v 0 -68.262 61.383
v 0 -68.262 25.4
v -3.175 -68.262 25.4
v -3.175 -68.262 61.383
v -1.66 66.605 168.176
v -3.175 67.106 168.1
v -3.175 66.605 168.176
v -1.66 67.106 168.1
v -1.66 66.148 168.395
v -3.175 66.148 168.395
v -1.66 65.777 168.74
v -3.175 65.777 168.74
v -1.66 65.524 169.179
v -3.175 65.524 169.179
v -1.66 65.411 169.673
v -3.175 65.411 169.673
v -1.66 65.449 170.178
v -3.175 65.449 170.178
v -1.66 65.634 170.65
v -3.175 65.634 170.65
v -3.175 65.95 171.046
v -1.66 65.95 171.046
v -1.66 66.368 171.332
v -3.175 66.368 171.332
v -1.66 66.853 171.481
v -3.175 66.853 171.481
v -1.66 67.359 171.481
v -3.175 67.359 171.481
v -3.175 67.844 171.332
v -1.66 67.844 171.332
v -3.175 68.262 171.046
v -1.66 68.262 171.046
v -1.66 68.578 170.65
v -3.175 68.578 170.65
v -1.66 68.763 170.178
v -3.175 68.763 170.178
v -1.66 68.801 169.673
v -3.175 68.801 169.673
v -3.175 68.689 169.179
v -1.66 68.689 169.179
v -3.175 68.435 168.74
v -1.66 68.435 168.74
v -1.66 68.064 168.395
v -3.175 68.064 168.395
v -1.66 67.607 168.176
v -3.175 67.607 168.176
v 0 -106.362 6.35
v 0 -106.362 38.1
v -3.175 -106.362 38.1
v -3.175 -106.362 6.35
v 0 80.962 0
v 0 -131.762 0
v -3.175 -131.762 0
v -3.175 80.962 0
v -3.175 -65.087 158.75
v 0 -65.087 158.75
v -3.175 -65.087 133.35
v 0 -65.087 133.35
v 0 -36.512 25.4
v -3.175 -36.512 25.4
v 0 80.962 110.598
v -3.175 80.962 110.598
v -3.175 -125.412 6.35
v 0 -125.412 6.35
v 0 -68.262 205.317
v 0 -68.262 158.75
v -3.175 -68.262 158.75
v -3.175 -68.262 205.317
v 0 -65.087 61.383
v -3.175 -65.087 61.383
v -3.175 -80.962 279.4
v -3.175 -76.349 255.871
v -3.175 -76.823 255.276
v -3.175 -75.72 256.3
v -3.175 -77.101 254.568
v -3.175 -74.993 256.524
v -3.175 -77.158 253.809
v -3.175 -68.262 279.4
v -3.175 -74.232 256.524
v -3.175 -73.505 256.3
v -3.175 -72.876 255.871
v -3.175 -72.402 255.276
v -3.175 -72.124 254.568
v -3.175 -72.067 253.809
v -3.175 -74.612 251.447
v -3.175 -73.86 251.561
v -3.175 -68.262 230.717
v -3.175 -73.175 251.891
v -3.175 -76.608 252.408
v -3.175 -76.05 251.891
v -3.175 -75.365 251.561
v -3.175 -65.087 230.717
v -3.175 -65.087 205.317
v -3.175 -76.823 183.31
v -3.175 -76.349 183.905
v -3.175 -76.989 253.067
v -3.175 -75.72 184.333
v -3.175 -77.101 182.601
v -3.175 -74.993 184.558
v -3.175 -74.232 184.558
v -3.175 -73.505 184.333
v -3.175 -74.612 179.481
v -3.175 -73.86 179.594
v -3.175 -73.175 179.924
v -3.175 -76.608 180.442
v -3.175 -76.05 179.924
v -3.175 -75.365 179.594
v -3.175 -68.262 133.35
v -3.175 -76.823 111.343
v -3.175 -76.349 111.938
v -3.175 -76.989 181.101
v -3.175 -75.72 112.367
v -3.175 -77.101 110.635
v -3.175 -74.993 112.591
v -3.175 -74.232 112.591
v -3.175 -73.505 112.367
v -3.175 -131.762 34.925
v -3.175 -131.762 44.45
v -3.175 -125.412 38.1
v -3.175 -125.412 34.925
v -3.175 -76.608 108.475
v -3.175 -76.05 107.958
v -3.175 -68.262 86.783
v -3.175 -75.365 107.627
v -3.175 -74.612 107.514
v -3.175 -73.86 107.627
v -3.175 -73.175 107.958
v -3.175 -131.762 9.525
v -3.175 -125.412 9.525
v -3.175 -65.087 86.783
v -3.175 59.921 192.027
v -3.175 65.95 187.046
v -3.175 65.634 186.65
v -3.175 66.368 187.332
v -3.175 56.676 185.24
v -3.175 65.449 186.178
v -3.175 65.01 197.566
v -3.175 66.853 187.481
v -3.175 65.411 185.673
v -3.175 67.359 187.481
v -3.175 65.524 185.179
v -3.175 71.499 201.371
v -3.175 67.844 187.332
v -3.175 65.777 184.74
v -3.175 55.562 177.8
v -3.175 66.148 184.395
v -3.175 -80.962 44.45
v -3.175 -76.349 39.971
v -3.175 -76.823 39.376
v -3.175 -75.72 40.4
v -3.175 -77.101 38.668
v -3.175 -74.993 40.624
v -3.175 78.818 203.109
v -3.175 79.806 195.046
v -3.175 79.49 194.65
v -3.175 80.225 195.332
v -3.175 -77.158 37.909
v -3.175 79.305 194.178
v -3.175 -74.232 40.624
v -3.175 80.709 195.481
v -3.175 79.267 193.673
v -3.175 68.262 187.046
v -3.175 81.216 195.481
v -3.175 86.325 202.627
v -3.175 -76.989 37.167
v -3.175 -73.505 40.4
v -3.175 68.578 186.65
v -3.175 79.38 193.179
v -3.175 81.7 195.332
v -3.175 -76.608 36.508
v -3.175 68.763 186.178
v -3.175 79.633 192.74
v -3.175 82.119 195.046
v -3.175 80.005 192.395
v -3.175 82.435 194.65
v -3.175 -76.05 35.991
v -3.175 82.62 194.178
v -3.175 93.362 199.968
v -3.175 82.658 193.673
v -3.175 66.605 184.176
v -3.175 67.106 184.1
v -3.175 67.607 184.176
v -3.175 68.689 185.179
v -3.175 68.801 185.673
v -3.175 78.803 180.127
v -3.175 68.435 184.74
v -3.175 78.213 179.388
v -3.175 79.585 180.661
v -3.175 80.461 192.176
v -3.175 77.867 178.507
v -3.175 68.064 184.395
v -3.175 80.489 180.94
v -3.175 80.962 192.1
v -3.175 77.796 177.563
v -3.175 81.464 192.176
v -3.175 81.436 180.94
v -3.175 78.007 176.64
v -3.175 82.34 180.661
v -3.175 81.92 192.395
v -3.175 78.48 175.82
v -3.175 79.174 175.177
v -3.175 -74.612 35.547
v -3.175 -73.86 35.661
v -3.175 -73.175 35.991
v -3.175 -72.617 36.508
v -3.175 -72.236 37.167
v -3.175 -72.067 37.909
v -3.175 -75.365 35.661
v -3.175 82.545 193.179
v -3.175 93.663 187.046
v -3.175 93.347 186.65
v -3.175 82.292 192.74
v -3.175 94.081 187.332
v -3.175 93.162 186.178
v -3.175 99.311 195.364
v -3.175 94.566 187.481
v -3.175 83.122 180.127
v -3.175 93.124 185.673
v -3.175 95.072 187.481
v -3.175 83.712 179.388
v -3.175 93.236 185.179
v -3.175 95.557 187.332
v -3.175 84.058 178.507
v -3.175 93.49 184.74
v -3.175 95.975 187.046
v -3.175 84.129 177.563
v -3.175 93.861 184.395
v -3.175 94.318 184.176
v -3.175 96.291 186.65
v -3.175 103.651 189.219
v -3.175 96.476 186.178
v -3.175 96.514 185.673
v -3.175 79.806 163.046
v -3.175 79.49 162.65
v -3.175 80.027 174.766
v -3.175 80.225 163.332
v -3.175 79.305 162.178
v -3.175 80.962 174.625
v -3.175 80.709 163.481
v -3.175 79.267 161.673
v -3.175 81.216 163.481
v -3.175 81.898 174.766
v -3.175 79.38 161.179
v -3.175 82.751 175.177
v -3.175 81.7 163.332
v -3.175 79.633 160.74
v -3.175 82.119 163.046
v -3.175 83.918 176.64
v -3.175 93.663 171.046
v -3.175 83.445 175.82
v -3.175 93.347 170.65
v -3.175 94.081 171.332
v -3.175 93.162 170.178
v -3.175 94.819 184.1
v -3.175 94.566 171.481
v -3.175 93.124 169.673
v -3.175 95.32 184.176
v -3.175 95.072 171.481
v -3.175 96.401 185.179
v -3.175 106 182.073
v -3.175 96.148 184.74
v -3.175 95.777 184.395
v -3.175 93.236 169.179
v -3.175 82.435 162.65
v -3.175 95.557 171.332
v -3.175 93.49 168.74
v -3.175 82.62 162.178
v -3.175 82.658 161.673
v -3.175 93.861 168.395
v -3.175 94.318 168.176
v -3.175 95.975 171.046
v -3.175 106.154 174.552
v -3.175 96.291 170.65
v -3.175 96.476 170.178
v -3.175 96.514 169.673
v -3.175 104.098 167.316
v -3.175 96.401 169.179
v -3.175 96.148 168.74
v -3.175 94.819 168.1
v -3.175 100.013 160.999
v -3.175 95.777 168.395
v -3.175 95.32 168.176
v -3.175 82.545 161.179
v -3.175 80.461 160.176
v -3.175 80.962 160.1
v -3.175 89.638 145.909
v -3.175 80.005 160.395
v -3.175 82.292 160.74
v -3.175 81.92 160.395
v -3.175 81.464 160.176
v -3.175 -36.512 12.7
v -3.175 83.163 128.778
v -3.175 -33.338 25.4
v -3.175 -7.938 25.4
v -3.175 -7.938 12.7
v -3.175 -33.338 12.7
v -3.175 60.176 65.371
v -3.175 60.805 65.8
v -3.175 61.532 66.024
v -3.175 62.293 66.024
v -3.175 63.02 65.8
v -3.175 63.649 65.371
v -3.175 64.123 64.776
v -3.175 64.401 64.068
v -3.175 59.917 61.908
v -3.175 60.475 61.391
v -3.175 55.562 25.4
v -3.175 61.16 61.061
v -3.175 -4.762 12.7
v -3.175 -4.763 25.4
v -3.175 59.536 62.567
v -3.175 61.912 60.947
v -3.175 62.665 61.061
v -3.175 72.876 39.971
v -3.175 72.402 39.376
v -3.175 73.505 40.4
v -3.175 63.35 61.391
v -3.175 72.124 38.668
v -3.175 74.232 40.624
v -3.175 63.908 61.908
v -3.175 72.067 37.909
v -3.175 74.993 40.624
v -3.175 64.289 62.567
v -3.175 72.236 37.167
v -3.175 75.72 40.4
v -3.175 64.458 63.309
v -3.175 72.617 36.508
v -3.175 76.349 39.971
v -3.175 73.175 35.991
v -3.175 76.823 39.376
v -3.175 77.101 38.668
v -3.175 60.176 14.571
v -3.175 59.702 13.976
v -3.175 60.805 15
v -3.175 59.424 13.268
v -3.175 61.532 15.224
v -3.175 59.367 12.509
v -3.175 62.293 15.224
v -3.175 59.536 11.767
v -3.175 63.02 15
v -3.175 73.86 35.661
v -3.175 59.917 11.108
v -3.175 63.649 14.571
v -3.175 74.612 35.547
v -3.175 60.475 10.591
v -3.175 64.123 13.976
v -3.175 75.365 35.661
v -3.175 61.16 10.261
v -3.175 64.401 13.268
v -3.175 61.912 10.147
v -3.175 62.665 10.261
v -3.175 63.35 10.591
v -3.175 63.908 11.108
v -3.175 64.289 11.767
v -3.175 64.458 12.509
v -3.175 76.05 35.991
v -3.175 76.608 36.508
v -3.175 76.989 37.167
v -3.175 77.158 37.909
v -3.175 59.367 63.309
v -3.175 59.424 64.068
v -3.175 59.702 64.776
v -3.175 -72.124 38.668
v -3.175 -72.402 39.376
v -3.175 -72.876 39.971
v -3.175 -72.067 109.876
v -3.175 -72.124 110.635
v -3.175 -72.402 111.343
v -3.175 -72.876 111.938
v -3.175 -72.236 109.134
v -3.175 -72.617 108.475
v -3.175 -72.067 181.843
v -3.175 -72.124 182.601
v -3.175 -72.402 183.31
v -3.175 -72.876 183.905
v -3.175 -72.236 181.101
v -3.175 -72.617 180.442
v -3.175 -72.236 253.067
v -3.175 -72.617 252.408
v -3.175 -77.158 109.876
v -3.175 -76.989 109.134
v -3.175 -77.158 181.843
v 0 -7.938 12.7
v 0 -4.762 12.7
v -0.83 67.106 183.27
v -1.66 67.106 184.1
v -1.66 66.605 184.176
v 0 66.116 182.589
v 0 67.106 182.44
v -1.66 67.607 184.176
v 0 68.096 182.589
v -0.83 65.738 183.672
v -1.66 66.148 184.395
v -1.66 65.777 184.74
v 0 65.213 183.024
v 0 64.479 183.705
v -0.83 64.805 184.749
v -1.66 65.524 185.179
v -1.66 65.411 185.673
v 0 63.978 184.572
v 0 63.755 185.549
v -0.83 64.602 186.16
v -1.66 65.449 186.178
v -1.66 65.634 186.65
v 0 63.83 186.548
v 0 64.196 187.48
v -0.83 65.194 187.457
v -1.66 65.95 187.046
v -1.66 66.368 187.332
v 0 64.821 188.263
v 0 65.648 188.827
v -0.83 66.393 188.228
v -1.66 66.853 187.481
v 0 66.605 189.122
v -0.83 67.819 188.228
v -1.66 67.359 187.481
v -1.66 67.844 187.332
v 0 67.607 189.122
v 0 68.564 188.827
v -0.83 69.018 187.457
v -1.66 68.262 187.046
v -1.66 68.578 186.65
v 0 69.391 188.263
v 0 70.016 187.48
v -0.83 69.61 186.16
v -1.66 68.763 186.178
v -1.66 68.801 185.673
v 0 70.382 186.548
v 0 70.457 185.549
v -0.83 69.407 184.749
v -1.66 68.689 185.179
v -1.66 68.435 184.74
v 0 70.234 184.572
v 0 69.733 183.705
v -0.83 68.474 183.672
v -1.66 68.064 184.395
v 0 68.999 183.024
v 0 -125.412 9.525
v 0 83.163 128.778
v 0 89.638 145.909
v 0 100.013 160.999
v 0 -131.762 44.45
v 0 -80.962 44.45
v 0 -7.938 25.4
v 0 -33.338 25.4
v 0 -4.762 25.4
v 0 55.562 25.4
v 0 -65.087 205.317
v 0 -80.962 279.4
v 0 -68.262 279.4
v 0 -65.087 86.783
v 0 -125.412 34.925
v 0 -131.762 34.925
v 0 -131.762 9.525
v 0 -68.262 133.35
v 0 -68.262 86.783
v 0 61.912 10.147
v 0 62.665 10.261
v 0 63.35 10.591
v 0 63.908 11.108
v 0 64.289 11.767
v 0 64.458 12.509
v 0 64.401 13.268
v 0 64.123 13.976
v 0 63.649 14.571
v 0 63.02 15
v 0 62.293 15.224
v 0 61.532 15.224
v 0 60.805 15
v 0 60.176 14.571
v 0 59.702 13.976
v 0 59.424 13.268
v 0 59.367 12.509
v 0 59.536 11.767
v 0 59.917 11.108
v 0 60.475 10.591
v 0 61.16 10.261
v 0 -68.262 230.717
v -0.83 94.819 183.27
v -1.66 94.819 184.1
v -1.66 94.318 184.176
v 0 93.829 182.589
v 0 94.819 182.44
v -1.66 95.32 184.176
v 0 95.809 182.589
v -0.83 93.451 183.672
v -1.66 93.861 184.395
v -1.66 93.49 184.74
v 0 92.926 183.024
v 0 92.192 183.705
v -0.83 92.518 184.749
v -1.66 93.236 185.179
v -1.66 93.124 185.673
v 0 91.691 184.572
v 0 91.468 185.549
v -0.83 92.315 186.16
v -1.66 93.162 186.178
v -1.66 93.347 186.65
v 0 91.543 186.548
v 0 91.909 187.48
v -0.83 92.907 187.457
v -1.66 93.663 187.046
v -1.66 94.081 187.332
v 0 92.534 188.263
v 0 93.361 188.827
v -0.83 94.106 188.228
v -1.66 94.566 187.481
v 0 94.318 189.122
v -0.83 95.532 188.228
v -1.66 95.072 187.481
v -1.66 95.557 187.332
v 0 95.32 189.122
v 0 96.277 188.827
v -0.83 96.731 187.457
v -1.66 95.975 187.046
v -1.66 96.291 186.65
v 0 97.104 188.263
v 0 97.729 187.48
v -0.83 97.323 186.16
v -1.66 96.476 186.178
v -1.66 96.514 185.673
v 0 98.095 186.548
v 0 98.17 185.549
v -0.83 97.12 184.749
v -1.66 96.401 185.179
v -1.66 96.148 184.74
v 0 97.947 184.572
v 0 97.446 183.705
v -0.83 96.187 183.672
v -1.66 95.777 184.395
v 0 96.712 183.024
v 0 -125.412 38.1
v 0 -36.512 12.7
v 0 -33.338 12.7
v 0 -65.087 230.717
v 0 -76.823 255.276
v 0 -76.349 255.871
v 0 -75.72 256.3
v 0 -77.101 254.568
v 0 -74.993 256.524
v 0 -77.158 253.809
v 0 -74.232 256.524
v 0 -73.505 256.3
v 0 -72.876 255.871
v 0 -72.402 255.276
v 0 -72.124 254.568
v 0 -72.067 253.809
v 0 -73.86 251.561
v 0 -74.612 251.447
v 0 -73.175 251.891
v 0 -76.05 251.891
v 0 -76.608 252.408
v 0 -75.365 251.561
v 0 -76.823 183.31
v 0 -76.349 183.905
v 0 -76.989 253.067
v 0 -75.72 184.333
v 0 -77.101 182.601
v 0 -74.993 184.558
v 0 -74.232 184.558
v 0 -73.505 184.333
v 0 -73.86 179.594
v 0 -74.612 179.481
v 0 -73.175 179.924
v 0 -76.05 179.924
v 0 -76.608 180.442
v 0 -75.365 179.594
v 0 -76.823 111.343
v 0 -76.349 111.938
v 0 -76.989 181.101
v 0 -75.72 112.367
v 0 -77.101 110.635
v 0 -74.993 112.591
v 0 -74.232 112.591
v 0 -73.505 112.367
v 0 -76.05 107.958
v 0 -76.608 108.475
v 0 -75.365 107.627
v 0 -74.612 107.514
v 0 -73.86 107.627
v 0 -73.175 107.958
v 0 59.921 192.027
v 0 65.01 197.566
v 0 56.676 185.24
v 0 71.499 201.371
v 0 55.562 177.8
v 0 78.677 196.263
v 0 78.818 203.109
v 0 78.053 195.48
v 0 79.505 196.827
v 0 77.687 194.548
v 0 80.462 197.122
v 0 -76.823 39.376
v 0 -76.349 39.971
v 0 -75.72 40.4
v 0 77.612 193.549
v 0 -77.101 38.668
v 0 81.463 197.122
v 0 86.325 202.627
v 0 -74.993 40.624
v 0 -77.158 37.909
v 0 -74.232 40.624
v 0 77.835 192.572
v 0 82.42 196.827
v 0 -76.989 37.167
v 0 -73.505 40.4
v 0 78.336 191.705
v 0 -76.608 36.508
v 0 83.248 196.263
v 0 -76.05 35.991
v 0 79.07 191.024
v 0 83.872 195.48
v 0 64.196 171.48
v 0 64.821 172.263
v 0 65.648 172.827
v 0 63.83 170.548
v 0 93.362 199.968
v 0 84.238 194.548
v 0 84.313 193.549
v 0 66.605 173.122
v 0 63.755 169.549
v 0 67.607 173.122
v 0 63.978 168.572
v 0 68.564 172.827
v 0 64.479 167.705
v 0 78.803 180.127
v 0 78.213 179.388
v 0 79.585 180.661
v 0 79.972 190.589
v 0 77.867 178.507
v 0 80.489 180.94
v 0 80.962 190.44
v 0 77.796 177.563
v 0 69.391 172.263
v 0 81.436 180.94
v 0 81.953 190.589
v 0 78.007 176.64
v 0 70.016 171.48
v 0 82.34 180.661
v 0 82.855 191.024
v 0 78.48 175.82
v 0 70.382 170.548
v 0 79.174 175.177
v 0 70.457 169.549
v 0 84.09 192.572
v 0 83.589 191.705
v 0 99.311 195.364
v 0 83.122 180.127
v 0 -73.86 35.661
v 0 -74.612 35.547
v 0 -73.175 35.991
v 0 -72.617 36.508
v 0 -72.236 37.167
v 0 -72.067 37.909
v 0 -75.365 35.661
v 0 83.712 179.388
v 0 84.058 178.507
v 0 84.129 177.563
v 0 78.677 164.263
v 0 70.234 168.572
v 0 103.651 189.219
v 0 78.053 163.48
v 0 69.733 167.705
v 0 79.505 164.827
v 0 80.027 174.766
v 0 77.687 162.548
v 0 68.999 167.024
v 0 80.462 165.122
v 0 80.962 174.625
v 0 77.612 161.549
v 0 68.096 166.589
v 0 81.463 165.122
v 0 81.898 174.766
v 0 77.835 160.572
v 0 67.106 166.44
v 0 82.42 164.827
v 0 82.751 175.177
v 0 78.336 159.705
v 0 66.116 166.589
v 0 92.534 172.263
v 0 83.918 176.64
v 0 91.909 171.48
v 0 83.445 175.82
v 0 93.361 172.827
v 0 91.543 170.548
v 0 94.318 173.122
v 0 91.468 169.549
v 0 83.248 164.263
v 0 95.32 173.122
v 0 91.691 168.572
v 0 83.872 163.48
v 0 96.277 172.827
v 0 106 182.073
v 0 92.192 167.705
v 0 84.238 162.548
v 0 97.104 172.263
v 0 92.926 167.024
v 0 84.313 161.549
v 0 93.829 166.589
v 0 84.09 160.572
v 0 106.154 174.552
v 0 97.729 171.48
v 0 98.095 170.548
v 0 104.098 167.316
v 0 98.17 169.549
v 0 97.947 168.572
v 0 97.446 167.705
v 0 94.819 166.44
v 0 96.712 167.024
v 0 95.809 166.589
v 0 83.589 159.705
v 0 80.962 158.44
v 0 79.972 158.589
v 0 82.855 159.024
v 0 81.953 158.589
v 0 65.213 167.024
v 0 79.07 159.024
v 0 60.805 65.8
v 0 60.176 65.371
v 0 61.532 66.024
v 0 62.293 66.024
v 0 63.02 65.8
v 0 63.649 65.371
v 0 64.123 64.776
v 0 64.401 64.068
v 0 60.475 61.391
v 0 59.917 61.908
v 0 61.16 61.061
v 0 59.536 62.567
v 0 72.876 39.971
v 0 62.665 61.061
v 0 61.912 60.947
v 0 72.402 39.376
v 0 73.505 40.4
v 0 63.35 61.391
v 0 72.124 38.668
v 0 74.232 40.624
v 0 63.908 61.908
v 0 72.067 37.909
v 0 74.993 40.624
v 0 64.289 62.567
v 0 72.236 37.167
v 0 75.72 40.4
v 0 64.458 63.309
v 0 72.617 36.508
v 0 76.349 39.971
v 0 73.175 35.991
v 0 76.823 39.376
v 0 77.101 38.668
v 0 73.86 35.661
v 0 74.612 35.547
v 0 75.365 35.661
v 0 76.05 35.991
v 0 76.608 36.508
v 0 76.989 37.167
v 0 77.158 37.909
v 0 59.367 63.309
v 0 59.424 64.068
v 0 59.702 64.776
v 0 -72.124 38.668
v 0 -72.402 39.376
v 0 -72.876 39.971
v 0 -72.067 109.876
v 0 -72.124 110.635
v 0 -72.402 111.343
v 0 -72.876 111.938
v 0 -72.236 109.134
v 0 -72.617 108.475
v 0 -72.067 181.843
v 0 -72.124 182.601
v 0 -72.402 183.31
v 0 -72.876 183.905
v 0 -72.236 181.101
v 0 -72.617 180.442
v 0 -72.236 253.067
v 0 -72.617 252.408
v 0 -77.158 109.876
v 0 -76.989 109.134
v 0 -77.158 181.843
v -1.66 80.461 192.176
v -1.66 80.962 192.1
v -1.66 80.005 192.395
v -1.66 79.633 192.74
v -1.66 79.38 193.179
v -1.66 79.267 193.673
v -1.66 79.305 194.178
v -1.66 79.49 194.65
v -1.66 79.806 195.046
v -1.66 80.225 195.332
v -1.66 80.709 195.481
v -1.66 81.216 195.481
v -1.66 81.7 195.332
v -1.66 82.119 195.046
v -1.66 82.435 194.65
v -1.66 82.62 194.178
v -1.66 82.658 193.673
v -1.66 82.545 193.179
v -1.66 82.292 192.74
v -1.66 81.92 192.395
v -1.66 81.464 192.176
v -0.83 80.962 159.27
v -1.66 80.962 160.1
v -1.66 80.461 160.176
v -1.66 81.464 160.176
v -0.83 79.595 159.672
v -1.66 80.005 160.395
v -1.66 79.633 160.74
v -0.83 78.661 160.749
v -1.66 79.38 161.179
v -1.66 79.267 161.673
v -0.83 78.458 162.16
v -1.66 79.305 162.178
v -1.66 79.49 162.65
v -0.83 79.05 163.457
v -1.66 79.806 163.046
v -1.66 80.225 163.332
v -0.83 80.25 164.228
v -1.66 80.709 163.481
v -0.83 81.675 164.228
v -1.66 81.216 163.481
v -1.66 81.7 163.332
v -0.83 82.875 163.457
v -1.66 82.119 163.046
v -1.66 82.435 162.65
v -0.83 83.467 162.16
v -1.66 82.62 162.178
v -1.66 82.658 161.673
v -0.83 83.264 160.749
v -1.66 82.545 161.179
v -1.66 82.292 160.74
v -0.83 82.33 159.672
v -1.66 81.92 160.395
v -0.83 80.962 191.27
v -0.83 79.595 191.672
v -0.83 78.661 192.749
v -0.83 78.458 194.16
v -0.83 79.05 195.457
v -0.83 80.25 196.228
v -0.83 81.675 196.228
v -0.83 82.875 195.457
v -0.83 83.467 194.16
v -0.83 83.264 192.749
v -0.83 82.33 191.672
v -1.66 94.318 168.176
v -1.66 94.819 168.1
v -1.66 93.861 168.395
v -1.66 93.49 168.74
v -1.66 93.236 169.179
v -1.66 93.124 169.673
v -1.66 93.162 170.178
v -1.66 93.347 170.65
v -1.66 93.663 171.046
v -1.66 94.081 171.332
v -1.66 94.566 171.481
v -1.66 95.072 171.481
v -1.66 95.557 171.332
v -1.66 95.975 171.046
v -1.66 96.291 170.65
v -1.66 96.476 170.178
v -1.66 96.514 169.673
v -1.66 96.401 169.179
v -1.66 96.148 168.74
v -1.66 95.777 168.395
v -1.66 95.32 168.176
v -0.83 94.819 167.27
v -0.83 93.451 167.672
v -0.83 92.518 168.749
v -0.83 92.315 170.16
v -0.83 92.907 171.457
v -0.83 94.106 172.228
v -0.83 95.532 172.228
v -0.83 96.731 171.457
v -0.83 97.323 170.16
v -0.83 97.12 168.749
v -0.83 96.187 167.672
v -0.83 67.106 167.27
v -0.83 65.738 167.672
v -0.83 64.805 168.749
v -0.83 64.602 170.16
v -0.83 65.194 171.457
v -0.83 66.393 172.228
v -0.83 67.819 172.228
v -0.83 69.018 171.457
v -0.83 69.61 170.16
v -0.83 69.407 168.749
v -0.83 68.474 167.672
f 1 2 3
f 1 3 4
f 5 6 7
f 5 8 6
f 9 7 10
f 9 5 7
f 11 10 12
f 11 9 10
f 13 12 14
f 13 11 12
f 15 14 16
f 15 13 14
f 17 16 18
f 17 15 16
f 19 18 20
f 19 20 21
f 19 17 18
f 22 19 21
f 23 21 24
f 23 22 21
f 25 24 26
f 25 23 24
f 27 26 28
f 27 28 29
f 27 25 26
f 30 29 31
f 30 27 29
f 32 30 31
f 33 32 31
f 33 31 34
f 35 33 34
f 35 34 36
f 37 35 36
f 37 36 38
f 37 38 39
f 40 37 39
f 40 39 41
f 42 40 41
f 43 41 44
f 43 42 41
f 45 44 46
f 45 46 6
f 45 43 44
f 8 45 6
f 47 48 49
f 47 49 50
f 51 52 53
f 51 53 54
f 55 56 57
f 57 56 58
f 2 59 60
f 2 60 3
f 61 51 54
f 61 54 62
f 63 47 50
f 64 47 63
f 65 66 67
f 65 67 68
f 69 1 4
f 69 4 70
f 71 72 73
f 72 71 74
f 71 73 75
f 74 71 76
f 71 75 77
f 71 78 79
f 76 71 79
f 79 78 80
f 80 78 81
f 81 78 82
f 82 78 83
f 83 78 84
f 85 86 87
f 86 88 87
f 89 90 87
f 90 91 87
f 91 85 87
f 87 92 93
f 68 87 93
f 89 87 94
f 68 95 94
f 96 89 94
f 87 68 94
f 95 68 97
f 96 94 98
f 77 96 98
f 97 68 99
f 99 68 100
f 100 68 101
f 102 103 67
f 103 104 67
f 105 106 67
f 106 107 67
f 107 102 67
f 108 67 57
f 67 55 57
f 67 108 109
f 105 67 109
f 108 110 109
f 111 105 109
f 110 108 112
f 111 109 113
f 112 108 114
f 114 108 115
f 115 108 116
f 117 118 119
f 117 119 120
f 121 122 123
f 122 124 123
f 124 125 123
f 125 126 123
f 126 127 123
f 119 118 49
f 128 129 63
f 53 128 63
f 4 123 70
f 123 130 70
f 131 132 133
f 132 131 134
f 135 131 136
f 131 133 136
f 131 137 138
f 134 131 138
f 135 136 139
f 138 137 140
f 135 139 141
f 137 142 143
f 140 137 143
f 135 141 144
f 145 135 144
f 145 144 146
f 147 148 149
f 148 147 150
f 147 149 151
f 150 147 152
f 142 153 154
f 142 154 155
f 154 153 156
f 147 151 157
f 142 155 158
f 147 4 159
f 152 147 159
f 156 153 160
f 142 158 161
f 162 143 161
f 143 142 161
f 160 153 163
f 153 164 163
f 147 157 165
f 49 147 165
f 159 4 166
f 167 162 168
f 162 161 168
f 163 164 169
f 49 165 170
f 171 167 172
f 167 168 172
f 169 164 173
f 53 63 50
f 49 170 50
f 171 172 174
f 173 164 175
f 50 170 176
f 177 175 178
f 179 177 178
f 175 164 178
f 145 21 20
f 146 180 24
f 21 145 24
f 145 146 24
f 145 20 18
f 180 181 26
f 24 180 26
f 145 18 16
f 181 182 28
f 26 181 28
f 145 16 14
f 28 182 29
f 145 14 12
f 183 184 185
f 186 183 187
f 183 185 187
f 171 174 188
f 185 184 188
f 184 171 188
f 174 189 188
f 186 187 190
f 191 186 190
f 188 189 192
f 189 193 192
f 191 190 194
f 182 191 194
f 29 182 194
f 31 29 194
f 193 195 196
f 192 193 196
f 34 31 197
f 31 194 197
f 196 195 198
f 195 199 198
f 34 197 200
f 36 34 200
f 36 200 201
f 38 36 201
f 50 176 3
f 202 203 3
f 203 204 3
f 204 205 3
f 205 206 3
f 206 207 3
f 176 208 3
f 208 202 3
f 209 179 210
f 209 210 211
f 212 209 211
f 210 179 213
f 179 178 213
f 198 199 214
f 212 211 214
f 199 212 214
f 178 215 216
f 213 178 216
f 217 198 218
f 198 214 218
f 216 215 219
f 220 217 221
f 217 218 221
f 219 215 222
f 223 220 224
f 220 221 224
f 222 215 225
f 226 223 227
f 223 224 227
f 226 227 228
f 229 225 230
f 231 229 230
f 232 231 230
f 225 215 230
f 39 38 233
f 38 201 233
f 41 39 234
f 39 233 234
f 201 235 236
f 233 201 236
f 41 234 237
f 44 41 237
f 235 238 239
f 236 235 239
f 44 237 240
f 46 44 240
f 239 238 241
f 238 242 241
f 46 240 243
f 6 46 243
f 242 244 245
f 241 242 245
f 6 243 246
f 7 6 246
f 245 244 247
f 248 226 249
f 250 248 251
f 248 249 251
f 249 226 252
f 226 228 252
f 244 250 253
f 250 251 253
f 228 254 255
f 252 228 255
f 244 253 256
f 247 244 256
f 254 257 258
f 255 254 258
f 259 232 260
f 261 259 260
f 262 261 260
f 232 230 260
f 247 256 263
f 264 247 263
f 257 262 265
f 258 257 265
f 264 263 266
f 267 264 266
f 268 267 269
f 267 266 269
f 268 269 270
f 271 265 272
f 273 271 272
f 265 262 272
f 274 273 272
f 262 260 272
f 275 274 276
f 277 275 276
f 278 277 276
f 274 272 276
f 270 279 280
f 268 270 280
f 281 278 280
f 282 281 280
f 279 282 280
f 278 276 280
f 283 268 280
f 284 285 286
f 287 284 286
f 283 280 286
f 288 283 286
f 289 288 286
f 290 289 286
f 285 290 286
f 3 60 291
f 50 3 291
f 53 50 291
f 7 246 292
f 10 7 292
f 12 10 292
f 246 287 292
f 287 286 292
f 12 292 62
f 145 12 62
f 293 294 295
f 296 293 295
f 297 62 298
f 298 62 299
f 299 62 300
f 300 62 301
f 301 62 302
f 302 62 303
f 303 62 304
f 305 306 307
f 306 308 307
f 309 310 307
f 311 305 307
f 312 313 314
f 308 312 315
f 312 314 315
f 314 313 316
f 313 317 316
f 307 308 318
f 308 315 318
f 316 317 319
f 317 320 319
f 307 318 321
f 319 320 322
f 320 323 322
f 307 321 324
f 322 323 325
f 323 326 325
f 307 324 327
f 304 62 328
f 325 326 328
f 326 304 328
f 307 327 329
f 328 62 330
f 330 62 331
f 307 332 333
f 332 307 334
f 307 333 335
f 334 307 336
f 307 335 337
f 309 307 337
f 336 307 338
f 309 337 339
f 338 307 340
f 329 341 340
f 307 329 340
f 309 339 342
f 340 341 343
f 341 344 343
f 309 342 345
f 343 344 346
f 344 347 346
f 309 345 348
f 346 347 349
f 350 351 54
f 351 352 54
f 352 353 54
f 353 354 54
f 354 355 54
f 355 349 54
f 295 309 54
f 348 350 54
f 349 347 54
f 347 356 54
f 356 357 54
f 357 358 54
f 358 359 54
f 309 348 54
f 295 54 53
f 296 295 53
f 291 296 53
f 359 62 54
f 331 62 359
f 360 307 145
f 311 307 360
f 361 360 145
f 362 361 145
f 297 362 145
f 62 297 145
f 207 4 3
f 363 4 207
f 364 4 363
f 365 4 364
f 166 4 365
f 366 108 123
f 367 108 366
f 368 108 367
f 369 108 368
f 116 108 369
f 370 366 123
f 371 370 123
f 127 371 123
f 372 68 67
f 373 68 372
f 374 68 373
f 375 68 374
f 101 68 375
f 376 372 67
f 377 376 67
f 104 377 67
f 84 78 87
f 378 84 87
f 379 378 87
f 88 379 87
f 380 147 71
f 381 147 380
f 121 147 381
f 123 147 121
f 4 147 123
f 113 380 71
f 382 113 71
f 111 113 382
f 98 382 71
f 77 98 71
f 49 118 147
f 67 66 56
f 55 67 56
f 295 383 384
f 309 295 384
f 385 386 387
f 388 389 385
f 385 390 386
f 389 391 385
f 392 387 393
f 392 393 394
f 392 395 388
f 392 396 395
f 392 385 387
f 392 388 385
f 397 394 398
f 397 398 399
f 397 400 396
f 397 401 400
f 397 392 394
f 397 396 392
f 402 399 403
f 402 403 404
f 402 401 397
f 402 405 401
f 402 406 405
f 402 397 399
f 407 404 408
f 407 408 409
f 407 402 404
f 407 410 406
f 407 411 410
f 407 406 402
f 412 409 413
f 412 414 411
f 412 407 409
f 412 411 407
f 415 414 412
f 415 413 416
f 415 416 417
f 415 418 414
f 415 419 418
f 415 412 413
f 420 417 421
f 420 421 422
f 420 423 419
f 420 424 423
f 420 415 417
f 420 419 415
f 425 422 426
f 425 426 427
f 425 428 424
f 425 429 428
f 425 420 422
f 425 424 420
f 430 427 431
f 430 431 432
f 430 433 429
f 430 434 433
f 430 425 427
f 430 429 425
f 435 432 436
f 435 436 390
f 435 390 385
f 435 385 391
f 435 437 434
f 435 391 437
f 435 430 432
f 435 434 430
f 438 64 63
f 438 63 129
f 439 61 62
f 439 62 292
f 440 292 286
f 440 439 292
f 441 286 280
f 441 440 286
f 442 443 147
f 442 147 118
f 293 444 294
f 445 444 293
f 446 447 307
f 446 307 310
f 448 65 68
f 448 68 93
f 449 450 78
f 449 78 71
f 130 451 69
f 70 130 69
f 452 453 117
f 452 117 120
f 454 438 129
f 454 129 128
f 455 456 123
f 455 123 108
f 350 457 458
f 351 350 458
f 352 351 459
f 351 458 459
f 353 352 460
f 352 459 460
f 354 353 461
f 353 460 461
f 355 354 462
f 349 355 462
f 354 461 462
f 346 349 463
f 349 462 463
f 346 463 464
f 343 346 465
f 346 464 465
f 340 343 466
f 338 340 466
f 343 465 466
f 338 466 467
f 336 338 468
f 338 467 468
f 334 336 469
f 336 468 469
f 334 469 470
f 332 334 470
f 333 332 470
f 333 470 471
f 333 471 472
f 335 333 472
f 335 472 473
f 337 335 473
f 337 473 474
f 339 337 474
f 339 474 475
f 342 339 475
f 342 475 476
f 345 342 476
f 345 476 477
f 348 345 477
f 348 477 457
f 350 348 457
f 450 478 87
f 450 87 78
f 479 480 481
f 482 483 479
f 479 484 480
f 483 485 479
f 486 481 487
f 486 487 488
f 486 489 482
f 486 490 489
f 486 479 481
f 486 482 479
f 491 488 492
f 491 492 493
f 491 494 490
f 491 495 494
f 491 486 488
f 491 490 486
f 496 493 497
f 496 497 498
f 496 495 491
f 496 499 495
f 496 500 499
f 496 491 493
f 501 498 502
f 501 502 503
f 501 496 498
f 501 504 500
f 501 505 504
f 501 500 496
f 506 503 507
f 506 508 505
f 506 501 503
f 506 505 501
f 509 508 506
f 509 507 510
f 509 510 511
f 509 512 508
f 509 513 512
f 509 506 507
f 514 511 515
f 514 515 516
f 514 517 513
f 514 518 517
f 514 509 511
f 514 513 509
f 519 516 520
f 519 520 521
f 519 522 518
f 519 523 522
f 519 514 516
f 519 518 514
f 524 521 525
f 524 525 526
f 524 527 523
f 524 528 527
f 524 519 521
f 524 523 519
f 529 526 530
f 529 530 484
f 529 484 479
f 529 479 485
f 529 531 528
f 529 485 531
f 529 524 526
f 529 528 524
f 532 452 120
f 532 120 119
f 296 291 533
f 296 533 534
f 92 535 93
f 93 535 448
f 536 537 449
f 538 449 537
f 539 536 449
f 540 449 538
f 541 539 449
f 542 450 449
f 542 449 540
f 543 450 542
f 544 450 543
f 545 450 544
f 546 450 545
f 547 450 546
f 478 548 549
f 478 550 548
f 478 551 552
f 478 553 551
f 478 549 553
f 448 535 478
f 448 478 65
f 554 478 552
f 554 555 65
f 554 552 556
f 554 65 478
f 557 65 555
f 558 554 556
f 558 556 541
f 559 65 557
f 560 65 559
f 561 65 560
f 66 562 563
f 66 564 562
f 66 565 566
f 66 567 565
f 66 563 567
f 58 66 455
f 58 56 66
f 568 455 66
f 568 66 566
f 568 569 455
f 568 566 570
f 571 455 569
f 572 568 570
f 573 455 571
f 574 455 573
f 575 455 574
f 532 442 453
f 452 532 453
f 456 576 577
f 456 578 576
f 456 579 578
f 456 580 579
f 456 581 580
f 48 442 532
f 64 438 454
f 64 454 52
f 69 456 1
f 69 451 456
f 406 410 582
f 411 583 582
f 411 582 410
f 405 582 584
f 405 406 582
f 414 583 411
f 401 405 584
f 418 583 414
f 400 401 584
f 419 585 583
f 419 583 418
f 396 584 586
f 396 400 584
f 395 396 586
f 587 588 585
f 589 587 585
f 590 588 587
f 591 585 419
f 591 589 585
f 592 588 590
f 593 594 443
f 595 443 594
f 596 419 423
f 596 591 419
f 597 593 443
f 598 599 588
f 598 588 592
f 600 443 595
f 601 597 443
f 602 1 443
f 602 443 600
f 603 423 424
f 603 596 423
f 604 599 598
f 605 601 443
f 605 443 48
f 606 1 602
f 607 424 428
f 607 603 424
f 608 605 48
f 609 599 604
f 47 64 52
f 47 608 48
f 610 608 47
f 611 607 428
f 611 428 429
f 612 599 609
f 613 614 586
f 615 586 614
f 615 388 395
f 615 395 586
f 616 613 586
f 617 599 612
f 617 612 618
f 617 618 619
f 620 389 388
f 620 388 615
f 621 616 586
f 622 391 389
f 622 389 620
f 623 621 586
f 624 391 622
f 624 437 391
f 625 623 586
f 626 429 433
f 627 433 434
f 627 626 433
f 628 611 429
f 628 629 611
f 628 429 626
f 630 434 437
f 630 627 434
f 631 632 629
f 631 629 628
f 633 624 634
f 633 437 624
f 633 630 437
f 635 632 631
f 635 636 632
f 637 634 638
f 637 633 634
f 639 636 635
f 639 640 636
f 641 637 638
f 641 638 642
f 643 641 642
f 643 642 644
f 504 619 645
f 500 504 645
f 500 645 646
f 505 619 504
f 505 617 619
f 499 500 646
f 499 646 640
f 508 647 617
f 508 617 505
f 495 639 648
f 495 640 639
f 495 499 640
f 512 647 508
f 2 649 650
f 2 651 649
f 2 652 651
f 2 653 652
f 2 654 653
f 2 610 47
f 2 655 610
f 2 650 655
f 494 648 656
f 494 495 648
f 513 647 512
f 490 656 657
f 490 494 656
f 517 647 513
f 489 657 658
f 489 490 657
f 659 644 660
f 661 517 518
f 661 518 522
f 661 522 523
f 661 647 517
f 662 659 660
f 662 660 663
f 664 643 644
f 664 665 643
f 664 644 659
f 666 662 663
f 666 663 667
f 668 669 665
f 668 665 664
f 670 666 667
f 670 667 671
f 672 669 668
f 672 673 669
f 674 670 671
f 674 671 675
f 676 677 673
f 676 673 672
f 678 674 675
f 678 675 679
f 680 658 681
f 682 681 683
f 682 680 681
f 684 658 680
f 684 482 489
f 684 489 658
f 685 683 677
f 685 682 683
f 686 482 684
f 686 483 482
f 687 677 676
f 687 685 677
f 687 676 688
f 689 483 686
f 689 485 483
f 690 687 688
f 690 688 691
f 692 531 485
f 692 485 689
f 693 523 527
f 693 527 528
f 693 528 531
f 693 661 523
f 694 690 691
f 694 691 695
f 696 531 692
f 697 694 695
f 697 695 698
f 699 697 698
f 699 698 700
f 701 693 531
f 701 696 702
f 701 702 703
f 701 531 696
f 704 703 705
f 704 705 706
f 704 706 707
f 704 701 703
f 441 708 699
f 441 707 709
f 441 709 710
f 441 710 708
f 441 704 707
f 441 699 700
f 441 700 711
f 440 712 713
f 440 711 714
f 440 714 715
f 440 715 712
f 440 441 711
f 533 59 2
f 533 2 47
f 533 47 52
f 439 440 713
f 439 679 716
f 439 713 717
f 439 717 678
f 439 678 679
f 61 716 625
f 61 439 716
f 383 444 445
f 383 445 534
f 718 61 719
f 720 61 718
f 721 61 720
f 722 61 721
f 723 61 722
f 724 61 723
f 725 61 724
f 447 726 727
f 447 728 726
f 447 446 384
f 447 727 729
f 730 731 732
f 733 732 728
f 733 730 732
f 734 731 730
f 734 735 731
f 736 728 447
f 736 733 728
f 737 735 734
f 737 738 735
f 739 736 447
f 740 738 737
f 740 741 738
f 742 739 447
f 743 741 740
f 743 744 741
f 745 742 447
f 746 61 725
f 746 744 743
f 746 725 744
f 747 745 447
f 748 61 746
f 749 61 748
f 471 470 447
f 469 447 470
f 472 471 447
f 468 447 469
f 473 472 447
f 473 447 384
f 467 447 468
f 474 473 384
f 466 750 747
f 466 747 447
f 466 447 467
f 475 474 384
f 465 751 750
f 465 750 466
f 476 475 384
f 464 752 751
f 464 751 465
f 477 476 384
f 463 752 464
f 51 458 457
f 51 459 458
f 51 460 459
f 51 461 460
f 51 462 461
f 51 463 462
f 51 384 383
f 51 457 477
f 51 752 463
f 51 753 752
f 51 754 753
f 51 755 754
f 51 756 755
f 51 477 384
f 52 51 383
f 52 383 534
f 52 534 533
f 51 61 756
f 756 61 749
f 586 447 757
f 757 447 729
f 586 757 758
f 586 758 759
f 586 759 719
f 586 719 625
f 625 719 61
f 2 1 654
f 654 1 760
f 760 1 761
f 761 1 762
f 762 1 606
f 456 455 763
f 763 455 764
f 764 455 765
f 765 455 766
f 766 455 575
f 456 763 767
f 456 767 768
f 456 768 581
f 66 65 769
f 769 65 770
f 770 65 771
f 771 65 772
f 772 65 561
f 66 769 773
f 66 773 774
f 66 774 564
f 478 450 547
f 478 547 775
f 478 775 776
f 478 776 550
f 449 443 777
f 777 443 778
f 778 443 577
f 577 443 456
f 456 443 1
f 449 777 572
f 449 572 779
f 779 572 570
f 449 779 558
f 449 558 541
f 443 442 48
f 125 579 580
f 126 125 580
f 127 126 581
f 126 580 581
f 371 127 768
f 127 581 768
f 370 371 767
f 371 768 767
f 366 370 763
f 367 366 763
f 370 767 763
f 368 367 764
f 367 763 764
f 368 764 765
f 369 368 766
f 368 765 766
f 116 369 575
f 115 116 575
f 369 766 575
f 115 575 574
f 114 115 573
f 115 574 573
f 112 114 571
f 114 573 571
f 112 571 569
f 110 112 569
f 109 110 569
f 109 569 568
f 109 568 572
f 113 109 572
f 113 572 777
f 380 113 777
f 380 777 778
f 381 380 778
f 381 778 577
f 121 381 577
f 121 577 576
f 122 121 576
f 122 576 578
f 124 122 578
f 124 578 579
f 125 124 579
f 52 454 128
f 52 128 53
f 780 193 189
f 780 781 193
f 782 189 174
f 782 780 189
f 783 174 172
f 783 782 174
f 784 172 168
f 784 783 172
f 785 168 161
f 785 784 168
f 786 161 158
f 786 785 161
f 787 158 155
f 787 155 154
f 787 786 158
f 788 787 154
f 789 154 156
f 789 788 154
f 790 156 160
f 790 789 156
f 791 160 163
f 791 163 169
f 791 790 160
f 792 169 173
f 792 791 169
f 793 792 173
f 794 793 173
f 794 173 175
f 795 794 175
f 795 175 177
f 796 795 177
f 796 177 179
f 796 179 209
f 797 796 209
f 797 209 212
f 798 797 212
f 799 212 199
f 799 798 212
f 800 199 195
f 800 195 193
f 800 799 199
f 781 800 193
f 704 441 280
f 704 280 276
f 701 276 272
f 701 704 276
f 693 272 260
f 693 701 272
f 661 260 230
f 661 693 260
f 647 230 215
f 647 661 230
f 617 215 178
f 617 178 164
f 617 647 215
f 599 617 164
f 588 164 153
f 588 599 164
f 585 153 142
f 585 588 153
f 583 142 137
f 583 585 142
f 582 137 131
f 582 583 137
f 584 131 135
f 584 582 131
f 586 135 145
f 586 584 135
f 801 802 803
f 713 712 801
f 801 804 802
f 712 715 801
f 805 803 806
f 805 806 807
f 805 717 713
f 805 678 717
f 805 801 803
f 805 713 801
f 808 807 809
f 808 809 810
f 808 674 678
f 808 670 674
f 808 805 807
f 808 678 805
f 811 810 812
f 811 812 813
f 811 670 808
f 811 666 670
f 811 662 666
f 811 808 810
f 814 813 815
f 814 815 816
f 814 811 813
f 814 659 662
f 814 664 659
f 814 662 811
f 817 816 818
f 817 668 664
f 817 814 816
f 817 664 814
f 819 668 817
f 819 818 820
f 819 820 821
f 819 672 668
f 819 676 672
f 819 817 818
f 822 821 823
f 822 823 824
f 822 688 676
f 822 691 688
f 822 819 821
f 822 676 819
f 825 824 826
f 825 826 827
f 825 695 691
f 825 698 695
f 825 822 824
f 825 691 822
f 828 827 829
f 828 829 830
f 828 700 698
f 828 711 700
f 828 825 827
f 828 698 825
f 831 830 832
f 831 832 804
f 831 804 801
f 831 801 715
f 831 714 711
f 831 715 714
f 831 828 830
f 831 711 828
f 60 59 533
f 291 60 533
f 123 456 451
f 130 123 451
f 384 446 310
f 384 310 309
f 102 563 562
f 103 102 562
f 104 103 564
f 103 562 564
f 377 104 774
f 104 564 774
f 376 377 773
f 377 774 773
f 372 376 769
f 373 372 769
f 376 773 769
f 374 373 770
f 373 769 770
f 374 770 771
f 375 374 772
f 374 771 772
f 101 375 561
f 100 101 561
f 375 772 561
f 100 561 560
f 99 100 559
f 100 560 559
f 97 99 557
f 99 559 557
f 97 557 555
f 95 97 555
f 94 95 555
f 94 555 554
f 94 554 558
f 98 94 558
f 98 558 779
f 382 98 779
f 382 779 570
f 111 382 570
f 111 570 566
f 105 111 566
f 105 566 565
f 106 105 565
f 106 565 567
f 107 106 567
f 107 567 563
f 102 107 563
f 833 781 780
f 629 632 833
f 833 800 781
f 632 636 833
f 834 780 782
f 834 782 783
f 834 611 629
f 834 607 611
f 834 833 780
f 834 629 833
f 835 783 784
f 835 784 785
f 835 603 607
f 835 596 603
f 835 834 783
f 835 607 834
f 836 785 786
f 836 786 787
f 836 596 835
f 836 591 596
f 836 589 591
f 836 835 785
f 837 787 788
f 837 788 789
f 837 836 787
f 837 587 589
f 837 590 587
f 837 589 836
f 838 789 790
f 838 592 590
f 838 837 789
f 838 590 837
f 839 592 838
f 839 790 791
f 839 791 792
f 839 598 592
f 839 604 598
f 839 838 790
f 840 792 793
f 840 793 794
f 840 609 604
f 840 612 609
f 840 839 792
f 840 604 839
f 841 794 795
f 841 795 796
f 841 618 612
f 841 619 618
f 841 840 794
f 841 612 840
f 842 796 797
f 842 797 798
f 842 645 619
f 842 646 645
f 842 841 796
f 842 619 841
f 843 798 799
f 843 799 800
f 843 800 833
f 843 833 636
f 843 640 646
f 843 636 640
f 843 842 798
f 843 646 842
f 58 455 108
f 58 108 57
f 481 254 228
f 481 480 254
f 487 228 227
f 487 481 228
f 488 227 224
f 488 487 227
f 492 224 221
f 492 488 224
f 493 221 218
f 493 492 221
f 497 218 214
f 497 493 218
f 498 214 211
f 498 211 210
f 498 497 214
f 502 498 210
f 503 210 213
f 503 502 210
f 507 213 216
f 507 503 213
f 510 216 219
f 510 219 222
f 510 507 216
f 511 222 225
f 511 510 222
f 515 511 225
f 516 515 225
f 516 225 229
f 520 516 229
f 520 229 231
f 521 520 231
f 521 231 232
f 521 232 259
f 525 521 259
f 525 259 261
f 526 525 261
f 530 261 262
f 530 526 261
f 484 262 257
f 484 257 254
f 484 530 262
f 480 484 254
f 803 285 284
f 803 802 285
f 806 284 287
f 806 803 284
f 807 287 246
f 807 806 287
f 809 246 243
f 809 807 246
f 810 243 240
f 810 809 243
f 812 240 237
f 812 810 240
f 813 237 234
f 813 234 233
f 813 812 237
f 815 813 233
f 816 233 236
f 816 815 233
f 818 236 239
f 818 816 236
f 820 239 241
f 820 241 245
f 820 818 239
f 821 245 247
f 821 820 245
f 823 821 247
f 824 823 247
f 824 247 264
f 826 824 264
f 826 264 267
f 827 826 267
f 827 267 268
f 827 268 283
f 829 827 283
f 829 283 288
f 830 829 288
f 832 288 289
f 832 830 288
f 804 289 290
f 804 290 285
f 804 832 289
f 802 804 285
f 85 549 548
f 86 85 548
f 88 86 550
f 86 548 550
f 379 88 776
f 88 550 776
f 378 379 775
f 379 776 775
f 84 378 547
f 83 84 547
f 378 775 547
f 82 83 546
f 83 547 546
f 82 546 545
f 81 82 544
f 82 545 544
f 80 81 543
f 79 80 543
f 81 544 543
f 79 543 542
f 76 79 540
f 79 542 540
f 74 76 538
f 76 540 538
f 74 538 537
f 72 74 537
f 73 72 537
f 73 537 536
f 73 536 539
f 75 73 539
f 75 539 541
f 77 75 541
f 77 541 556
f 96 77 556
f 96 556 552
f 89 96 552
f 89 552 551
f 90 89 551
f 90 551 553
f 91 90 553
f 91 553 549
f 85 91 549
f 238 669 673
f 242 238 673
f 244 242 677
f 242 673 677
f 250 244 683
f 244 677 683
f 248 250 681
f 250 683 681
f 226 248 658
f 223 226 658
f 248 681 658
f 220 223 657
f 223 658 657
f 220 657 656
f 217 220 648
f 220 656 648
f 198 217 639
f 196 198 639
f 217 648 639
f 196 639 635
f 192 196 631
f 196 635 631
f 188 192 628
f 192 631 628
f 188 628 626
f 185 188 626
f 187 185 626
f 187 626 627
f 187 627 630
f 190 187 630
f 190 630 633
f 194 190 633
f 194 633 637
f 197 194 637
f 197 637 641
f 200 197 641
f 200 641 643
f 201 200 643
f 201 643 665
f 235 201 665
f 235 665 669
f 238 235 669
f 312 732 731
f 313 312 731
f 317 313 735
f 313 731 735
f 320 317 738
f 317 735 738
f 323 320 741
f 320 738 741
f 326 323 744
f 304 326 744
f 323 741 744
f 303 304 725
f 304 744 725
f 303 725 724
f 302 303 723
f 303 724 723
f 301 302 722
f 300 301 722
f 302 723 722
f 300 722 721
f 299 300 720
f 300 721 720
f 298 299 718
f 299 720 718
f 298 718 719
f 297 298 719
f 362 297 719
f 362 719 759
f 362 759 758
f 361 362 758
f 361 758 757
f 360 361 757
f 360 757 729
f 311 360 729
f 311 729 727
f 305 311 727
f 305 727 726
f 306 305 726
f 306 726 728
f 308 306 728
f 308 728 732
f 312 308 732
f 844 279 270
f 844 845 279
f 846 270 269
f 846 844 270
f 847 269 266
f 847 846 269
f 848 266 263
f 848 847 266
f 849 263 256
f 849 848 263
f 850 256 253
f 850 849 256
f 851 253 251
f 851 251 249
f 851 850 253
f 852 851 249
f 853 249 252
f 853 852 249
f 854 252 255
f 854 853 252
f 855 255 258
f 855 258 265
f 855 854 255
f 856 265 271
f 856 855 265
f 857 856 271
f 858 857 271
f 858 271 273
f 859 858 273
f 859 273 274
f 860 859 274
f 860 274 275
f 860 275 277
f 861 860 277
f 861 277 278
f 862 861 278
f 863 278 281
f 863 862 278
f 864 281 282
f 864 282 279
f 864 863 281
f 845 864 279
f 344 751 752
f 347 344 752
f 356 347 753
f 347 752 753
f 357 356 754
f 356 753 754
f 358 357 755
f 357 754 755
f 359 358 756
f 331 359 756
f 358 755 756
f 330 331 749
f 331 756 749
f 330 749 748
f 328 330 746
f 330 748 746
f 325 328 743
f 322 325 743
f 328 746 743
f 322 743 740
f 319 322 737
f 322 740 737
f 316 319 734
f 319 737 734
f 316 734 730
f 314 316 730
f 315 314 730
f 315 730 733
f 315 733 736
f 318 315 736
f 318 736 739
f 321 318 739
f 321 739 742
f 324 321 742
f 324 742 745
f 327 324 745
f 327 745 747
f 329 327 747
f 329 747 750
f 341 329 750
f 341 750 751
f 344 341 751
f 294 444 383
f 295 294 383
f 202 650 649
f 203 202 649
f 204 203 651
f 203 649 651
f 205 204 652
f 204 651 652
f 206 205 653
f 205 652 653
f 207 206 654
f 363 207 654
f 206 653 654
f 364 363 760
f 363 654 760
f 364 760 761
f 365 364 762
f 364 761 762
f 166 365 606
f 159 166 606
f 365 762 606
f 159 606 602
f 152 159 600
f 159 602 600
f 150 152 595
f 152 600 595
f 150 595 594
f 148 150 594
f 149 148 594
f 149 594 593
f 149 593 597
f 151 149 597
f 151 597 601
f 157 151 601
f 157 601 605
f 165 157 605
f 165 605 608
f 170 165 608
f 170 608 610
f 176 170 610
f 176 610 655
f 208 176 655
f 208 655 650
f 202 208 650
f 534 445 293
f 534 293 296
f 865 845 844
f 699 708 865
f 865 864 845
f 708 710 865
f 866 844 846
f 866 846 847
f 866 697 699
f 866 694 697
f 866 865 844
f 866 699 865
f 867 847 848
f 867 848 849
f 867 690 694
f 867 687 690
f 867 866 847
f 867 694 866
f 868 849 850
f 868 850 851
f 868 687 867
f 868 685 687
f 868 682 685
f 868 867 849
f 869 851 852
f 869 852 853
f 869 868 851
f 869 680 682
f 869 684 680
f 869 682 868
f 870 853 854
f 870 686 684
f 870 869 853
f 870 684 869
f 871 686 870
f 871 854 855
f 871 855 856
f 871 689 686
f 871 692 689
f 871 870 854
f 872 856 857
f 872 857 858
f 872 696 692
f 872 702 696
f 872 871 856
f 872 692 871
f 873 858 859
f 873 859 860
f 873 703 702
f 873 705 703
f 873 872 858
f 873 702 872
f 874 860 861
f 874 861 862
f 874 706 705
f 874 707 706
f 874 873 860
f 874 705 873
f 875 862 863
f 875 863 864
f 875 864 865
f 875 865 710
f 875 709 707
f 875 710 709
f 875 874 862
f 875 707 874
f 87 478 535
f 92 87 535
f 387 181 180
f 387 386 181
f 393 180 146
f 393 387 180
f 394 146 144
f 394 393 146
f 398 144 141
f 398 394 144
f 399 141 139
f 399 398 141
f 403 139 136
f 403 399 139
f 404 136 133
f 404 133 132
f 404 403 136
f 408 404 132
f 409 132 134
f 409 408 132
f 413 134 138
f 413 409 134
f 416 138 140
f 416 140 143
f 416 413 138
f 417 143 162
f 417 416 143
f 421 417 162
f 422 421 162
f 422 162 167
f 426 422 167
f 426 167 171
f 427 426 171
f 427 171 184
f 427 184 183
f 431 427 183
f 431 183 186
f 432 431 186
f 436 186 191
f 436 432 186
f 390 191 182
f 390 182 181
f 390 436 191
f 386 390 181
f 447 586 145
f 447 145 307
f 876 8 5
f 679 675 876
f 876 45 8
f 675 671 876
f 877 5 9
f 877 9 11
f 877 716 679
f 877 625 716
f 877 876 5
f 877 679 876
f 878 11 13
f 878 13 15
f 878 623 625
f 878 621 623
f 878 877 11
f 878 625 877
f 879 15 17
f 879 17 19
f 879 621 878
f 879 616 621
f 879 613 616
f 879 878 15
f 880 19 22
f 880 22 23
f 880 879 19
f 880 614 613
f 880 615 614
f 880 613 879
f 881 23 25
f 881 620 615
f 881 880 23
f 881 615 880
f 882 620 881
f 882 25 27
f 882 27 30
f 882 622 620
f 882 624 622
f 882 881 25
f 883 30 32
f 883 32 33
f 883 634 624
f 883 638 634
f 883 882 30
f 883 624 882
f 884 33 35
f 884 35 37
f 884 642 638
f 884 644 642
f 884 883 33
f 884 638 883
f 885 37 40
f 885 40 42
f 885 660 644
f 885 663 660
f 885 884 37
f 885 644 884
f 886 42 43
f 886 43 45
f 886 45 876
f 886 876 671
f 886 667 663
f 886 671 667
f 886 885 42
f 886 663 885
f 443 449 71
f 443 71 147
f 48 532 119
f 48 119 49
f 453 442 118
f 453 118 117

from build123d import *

# Parameters (mm, degrees)
BASE_FLANGE1_DEPTH           = 3.175
SKETCH8_W                    = 12.7
SKETCH8_H                    = 3.175
CUT_EXTRUDE2_DEPTH           = 309.926847379
SKETCH11_R                   = 3.175
CUT_EXTRUDE4_DEPTH           = 309.926847379
SKETCH21_R                   = 2.5527
CUT_EXTRUDE5_DEPTH           = 309.926847379
SKETCH23_W                   = 25.4
SKETCH23_H                   = 3.175
TAB1_DEPTH                   = 3.175
CSK_FOR_M3_SFHCS1_AT_2_COUNT = 2
CSK_FOR_M3_SFHCS1_AT_2_PITCH = 16
CSK_FOR_M3_SFHCS1_AT_3_COUNT = 2
CSK_FOR_M3_SFHCS1_AT_3_PITCH = 27.712812921
CSK_FOR_M3_SFHCS1_AT_4_COUNT = 2
CSK_FOR_M3_SFHCS1_AT_4_PITCH = 32
CSK_FOR_M3_SFHCS1_AT_5_COUNT = 2
CSK_FOR_M3_SFHCS1_AT_5_PITCH = 27.712812921
CSK_FOR_M3_SFHCS1_AT_6_COUNT = 2
CSK_FOR_M3_SFHCS1_AT_6_PITCH = 16


# Sheet-metal steps are written as plain solids
with BuildPart() as part:
    # Sketch1 → Base-Flange1 (new body)
    with BuildSketch(Plane(origin=(0, 0, 0), x_dir=(0, 0, -1), z_dir=(1, 0, 0))):
        with BuildLine():
            Line((0, -80.9625), (0, 80.9625))
            Line((0, 80.9625), (-110.597916699, 80.9625))
            ThreePointArc((-110.597916699, 80.9625), (-137.538685062, 85.883926782), (-160.999479175, 100.0125))
            ThreePointArc((-160.999479175, 100.0125), (-201.559524406, 89.942756121), (-177.8, 55.5625))
            Line((-177.8, 55.5625), (-25.4, 55.5625))
            Line((-25.4, 55.5625), (-25.4, -68.2625))
            Line((-25.4, -68.2625), (-279.4, -68.2625))
            Line((-279.4, -68.2625), (-279.4, -80.9625))
            Line((-279.4, -80.9625), (-44.45, -80.9625))
            Line((-44.45, -80.9625), (-44.45, -131.7625))
            Line((-44.45, -131.7625), (-34.925, -131.7625))
            Line((-34.925, -131.7625), (-34.925, -125.4125))
            Line((-34.925, -125.4125), (-38.1, -125.4125))
            Line((-38.1, -125.4125), (-38.1, -106.3625))
            Line((-38.1, -106.3625), (-6.35, -106.3625))
            Line((-6.35, -106.3625), (-6.35, -125.4125))
            Line((-6.35, -125.4125), (-9.525, -125.4125))
            Line((-9.525, -125.4125), (-9.525, -131.7625))
            Line((-9.525, -131.7625), (0, -131.7625))
            Line((0, -131.7625), (0, -80.9625))
        make_face()
    extrude(amount=-BASE_FLANGE1_DEPTH)

    # Sketch8 → Cut-Extrude2 (cut, through all)
    with BuildSketch(Plane(origin=(0, 0, 0), x_dir=(0, 0, -1), z_dir=(1, 0, 0))):
        with Locations((-19.05, -6.35)):
            Rectangle(SKETCH8_W, SKETCH8_H)
        with Locations((-19.05, -34.925)):
            Rectangle(SKETCH8_W, SKETCH8_H)
    extrude(amount=-CUT_EXTRUDE2_DEPTH, mode=Mode.SUBTRACT)

    # Sketch11 → Cut-Extrude4 (cut, through all)
    with BuildSketch(Plane(origin=(0, 0, 0), x_dir=(0, 0, -1), z_dir=(1, 0, 0))):
        with Locations((-177.8, 80.9625)):
            Circle(SKETCH11_R)
    extrude(amount=-CUT_EXTRUDE4_DEPTH, mode=Mode.SUBTRACT)

    # Sketch21 → Cut-Extrude5 (cut, through all)
    with BuildSketch(Plane(origin=(0, 0, 0), x_dir=(0, 0, -1), z_dir=(1, 0, 0))):
        with Locations((-38.1, -74.6125)):
            Circle(SKETCH21_R)
        with Locations((-110.066666667, -74.6125)):
            Circle(SKETCH21_R)
        with Locations((-182.033333333, -74.6125)):
            Circle(SKETCH21_R)
        with Locations((-254, -74.6125)):
            Circle(SKETCH21_R)
        with Locations((-12.7, 61.9125)):
            Circle(SKETCH21_R)
        with Locations((-38.1, 74.6125)):
            Circle(SKETCH21_R)
        with Locations((-63.5, 61.9125)):
            Circle(SKETCH21_R)
    extrude(amount=-CUT_EXTRUDE5_DEPTH, mode=Mode.SUBTRACT)

    # Sketch23 → Tab1 (add)
    with BuildSketch(Plane(origin=(0, 0, 0), x_dir=(0, 0, -1), z_dir=(1, 0, 0))):
        with Locations((-218.016666667, -66.675)):
            Rectangle(SKETCH23_W, SKETCH23_H)
        with Locations((-146.05, -66.675)):
            Rectangle(SKETCH23_W, SKETCH23_H)
        with Locations((-74.083333333, -66.675)):
            Rectangle(SKETCH23_W, SKETCH23_H)
    extrude(amount=-TAB1_DEPTH)

    # Sketch25 → CSK for M3 SFHCS1 (revolve, cut)
    with BuildSketch(Plane(origin=(0, 80.9625, 161.8), x_dir=(0, 0, -1), z_dir=(0, 1, 0))):
        Polygon((0, 0), (0, 3.175), (1.7, 3.175), (1.7, 1.66), (3.36, 0), align=None)
    csk_for_m3_sfhcs1 = revolve(axis=Axis((6.35, 80.9625, 161.8), (-1, 0, 0)), mode=Mode.SUBTRACT)

    # CSK for M3 SFHCS1 at 2: CSK for M3 SFHCS1 ×2
    with Locations(*[Vector(0, -0.8660254037844389, 0.4999999999999998) * (i * CSK_FOR_M3_SFHCS1_AT_2_PITCH) for i in range(1, CSK_FOR_M3_SFHCS1_AT_2_COUNT)]):
        add(csk_for_m3_sfhcs1, mode=Mode.SUBTRACT)

    # CSK for M3 SFHCS1 at 3: CSK for M3 SFHCS1 ×2
    with Locations(*[Vector(0, -0.500000000000002, 0.8660254037844376) * (i * CSK_FOR_M3_SFHCS1_AT_3_PITCH) for i in range(1, CSK_FOR_M3_SFHCS1_AT_3_COUNT)]):
        add(csk_for_m3_sfhcs1, mode=Mode.SUBTRACT)

    # CSK for M3 SFHCS1 at 4: CSK for M3 SFHCS1 ×2
    with Locations(*[(0, 0, i * CSK_FOR_M3_SFHCS1_AT_4_PITCH) for i in range(1, CSK_FOR_M3_SFHCS1_AT_4_COUNT)]):
        add(csk_for_m3_sfhcs1, mode=Mode.SUBTRACT)

    # CSK for M3 SFHCS1 at 5: CSK for M3 SFHCS1 ×2
    with Locations(*[Vector(0, 0.5000000000000007, 0.8660254037844384) * (i * CSK_FOR_M3_SFHCS1_AT_5_PITCH) for i in range(1, CSK_FOR_M3_SFHCS1_AT_5_COUNT)]):
        add(csk_for_m3_sfhcs1, mode=Mode.SUBTRACT)

    # CSK for M3 SFHCS1 at 6: CSK for M3 SFHCS1 ×2
    with Locations(*[Vector(0, 0.8660254037844379, 0.5000000000000013) * (i * CSK_FOR_M3_SFHCS1_AT_6_PITCH) for i in range(1, CSK_FOR_M3_SFHCS1_AT_6_COUNT)]):
        add(csk_for_m3_sfhcs1, mode=Mode.SUBTRACT)


solid = part.part
